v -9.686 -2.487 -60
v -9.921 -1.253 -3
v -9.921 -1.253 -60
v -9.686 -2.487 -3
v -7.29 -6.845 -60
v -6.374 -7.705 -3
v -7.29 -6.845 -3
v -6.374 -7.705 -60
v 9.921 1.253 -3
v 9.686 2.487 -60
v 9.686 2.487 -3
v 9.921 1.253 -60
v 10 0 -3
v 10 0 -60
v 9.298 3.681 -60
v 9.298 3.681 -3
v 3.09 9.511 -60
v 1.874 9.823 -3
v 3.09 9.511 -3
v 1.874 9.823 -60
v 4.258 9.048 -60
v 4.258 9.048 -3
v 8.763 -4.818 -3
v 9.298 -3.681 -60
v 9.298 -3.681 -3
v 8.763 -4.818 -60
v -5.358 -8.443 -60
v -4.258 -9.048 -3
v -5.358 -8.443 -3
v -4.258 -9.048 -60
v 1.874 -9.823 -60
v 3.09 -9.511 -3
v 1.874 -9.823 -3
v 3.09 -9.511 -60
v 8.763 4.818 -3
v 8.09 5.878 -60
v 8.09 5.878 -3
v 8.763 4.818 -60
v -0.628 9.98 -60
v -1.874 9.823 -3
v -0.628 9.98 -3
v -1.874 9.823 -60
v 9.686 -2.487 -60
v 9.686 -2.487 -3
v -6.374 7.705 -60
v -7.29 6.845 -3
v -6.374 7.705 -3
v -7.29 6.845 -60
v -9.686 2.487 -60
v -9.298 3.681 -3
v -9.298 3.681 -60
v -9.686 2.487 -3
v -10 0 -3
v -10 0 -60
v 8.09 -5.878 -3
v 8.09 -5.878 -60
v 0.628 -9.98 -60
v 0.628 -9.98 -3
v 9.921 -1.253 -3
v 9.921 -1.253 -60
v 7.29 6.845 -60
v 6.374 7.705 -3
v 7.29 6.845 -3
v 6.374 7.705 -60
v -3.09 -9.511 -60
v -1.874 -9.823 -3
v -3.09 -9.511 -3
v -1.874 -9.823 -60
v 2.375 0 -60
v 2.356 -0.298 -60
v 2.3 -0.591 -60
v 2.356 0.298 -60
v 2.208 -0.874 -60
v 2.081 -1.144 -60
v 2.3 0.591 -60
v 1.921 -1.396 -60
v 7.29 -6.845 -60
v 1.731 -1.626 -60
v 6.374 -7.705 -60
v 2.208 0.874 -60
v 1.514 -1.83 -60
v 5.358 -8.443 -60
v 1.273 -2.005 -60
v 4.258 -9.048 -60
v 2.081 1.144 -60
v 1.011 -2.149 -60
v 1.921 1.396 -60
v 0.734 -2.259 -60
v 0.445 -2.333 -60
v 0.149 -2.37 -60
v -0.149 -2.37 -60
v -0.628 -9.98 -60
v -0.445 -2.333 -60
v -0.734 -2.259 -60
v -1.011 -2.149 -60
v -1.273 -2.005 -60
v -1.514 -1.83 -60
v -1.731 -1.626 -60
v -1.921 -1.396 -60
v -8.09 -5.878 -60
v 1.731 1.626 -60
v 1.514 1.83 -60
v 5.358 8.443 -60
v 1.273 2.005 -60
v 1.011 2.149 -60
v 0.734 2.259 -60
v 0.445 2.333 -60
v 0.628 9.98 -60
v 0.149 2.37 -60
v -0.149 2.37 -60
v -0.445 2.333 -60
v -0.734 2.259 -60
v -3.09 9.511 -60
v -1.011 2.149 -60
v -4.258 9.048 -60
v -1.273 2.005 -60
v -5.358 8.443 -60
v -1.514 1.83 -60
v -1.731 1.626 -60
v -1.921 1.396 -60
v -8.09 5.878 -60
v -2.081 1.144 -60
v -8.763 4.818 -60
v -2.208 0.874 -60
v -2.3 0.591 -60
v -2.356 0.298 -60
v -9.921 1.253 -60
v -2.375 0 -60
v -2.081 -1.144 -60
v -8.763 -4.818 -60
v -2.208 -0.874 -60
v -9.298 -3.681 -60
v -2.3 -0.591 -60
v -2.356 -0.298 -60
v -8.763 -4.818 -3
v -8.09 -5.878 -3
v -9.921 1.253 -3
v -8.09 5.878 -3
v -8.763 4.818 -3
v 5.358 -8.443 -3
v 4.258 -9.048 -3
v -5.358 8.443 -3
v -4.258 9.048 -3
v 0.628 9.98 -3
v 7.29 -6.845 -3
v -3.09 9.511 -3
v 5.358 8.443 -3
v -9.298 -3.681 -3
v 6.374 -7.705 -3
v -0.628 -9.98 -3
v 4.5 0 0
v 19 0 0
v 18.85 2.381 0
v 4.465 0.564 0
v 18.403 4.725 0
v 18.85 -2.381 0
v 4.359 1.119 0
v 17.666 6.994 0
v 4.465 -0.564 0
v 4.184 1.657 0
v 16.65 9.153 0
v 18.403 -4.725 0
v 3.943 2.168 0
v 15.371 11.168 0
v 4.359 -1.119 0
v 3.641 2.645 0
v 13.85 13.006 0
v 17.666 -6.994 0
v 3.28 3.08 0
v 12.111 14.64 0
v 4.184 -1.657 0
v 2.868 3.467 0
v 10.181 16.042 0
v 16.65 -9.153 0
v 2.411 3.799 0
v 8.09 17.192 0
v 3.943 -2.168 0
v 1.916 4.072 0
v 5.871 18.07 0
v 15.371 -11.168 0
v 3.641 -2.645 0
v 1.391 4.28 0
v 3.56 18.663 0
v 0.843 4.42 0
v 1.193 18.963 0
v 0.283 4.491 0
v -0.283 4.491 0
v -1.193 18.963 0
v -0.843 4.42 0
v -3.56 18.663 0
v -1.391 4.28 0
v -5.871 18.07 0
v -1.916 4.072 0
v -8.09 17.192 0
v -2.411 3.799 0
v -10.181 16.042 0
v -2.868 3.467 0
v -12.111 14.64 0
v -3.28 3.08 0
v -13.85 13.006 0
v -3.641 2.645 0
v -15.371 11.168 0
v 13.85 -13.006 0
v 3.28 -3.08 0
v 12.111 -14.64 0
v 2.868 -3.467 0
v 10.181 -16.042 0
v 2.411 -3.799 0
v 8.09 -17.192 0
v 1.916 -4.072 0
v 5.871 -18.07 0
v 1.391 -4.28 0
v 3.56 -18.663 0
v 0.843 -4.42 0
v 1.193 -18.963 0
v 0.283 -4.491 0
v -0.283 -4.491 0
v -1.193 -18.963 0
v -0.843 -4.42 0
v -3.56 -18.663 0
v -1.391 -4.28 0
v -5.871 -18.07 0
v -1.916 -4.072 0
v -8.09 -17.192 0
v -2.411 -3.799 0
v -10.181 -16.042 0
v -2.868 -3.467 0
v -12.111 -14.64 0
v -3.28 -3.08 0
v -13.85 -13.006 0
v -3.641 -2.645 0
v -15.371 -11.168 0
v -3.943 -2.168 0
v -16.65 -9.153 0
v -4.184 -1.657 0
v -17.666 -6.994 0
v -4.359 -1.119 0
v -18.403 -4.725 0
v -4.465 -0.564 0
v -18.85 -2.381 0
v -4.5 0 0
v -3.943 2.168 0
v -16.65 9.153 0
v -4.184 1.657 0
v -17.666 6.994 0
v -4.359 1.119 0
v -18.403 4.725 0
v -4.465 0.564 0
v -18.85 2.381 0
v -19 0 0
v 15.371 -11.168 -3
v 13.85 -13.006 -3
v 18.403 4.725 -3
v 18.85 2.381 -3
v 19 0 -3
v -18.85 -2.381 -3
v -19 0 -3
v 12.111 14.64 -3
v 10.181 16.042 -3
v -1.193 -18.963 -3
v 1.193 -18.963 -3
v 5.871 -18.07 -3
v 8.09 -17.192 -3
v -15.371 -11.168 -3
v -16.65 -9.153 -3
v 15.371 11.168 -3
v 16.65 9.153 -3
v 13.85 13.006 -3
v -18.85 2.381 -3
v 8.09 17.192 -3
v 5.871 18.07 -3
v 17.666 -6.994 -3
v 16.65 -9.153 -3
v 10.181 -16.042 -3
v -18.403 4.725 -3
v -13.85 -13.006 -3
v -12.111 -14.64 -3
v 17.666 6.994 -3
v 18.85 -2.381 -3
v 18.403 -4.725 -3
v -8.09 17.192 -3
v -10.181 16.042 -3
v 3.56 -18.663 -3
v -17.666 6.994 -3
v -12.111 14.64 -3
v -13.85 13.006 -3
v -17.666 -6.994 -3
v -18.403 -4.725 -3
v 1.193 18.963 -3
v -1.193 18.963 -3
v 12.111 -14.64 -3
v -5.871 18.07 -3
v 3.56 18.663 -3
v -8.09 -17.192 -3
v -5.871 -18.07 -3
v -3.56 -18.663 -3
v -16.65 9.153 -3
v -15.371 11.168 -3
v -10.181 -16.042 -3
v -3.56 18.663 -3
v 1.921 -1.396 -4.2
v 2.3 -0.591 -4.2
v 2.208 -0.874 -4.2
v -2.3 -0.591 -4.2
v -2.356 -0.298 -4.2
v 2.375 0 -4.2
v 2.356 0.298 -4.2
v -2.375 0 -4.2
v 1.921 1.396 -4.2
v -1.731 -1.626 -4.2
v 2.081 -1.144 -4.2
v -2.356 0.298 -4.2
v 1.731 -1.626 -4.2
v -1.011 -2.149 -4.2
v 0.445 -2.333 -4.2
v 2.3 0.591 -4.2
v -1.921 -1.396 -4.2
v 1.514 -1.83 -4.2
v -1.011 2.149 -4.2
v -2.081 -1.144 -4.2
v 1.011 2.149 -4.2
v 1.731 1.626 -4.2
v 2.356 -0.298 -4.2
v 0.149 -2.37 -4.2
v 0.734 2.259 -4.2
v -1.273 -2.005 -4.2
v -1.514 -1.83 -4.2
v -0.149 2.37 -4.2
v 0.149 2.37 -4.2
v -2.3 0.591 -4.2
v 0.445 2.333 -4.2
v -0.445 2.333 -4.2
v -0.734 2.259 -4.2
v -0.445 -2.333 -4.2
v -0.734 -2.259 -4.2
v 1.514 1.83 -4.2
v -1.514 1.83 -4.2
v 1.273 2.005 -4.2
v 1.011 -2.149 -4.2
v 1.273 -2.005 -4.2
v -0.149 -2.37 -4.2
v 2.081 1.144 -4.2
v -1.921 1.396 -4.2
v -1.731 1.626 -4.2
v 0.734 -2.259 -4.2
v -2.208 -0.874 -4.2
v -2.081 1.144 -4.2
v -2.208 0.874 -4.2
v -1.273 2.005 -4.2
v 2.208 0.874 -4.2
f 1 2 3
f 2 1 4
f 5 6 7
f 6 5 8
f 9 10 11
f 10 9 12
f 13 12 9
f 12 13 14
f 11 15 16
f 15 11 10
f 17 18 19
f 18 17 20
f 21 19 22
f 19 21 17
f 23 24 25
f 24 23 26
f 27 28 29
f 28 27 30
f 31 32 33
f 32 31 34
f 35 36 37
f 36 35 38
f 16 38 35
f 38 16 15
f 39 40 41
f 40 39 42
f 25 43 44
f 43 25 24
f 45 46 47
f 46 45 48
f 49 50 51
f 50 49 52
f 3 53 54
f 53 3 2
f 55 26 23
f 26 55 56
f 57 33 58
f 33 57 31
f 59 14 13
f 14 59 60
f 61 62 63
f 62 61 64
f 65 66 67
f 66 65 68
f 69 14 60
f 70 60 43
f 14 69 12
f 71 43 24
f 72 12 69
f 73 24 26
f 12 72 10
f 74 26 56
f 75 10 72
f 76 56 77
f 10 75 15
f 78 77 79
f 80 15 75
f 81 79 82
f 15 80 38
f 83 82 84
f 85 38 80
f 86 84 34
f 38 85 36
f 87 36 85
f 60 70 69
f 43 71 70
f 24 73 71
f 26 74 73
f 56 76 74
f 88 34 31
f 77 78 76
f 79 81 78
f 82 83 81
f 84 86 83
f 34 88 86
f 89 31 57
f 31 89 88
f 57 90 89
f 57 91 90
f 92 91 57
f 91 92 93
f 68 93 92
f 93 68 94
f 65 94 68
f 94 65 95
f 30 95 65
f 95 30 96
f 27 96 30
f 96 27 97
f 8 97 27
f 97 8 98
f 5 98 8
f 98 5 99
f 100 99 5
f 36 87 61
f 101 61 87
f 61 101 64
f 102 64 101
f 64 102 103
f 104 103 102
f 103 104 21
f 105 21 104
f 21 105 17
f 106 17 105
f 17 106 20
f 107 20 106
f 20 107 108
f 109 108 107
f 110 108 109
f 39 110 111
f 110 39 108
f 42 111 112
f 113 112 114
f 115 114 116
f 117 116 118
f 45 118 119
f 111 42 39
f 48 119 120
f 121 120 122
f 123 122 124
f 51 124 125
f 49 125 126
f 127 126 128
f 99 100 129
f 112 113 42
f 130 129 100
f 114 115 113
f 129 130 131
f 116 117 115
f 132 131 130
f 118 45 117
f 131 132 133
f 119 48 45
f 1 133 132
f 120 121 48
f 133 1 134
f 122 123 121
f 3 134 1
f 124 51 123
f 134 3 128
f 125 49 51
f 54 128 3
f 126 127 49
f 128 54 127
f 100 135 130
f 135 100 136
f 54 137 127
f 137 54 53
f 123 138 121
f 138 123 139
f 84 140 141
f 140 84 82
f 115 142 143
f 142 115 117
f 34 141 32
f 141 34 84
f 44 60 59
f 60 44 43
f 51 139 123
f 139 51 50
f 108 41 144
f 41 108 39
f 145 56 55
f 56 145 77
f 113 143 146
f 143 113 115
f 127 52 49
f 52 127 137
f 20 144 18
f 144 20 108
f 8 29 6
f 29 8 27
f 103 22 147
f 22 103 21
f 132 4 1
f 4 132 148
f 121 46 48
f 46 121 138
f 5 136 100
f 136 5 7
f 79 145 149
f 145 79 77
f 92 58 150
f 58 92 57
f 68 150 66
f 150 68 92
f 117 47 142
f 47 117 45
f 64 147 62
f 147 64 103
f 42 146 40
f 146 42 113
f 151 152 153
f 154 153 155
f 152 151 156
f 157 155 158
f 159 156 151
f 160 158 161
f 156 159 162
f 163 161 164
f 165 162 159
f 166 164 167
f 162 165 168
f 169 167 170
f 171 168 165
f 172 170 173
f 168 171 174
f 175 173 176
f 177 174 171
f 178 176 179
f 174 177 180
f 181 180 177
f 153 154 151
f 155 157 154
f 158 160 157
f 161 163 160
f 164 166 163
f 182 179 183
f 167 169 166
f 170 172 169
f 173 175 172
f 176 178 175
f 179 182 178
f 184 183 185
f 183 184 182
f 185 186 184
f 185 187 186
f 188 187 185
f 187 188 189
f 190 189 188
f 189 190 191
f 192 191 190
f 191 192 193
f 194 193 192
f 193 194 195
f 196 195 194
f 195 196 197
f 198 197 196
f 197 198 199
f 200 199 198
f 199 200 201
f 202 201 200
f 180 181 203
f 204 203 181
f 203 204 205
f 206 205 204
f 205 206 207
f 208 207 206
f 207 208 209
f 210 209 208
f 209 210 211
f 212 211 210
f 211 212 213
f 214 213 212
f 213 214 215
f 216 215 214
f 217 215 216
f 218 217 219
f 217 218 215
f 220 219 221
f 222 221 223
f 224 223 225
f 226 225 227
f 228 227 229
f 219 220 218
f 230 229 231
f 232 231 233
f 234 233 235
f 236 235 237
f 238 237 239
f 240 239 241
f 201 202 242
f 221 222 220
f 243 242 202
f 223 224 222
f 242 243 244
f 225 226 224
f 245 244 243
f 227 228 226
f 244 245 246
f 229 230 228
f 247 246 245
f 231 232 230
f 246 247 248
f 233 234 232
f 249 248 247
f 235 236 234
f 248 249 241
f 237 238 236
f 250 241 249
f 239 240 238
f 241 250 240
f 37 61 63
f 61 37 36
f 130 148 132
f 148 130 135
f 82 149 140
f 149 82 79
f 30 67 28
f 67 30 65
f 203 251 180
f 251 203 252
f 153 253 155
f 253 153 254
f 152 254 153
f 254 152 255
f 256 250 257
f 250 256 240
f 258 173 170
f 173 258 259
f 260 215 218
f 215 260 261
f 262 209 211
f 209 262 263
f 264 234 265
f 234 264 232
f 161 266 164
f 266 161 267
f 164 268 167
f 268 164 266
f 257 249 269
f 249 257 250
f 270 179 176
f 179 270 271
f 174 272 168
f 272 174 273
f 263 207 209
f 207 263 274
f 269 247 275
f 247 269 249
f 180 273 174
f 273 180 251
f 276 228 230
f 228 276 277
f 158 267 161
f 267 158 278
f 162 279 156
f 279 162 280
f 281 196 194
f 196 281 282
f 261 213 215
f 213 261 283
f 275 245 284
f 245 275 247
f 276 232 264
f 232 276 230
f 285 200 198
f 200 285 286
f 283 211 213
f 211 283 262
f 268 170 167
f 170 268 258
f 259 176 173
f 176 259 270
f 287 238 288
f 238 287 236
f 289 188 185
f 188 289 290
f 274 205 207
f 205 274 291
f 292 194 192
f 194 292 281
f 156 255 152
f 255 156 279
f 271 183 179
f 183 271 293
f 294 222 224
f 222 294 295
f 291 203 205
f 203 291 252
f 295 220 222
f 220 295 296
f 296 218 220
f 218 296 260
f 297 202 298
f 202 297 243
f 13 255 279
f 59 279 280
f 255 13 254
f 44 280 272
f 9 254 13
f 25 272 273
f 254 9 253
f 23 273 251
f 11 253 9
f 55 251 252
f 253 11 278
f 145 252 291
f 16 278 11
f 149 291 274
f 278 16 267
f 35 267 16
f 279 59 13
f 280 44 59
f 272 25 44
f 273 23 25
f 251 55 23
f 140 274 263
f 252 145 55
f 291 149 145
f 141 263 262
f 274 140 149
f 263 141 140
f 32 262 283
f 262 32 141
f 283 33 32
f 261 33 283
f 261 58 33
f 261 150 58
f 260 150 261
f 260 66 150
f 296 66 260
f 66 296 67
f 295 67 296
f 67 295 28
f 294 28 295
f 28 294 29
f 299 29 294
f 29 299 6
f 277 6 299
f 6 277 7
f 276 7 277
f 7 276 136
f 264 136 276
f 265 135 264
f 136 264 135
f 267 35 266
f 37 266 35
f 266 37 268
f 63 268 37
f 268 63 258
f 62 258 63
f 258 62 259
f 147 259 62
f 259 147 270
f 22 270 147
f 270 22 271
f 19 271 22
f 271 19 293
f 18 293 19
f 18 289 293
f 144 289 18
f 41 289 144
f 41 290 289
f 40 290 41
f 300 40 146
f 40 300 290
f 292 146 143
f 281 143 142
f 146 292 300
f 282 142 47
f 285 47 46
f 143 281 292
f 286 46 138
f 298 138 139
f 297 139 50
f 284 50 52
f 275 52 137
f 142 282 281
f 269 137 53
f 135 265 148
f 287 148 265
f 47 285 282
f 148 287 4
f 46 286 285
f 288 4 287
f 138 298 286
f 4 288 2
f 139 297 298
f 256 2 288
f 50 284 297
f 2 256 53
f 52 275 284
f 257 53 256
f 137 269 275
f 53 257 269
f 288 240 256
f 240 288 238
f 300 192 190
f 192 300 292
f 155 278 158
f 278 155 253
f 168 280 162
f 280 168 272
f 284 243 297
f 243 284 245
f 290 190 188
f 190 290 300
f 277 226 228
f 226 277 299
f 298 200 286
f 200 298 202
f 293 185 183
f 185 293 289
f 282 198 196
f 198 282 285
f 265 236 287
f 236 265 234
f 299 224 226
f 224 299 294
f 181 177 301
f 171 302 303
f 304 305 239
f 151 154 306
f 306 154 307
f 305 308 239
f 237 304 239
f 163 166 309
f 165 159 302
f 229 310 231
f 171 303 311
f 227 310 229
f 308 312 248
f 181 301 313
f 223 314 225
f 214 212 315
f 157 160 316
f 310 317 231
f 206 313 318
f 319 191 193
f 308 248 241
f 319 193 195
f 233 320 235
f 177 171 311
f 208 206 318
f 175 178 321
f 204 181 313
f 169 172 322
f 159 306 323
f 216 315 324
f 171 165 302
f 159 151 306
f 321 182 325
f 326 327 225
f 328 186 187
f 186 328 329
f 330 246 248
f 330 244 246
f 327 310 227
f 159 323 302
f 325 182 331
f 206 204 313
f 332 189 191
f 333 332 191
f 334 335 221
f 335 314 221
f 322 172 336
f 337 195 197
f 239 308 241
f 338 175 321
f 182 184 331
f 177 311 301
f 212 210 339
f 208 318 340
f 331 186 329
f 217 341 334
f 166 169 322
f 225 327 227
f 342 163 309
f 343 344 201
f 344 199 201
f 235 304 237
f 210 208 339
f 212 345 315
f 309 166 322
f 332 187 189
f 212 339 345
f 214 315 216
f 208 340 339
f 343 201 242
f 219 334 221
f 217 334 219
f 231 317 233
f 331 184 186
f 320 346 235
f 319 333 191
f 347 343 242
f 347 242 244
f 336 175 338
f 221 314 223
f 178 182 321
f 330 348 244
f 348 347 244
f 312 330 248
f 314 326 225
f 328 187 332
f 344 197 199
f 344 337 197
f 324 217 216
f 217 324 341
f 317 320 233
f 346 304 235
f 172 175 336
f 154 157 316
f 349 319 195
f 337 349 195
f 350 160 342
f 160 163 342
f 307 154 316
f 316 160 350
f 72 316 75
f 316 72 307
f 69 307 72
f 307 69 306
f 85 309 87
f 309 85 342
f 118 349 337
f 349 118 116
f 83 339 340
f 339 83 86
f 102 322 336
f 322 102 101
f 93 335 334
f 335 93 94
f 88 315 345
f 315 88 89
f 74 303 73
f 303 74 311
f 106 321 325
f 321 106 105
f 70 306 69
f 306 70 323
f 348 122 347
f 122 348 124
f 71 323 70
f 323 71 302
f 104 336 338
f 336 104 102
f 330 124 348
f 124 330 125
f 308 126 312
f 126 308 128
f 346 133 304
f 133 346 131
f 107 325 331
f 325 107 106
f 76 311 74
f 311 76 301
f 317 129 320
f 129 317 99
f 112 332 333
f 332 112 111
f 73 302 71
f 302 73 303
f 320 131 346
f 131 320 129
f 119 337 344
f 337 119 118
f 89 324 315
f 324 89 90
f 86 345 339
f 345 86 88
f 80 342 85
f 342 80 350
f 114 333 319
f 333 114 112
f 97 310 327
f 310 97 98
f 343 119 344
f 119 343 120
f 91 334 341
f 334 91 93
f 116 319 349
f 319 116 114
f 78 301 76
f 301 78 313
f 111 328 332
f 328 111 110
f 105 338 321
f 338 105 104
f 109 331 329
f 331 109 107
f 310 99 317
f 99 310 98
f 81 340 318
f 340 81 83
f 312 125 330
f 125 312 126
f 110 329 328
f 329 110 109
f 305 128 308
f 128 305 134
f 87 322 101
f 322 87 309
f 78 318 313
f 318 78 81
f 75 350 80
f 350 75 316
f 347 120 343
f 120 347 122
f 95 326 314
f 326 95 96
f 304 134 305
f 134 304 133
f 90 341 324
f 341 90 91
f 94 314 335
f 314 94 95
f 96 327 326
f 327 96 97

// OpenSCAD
$fn = 50;


difference() {
	union() {
		translate(v = [0, 0, -60.0000000000]) {
			cylinder(h = 60, r = 10.0000000000);
		}
		translate(v = [0, 0, -3.0000000000]) {
			cylinder(h = 3, r = 19.0000000000);
		}
	}
	union() {
		translate(v = [0, 0, 0]) {
			rotate(a = [0, 0, 0]) {
				difference() {
					union() {
						#translate(v = [0, 0, -60.0000000000]) {
							cylinder(h = 60, r = 2.2500000000);
						}
						#translate(v = [0, 0, -4.2000000000]) {
							cylinder(h = 4.2000000000, r = 10.0000000000, r1 = 2.3750000000, r2 = 4.5000000000);
						}
						#translate(v = [0, 0, -60.0000000000]) {
							cylinder(h = 60, r = 2.3750000000);
						}
						#translate(v = [0, 0, -60.0000000000]) {
							cylinder(h = 60, r = 2.2500000000);
						}
					}
					union();
				}
			}
		}
	}
}
